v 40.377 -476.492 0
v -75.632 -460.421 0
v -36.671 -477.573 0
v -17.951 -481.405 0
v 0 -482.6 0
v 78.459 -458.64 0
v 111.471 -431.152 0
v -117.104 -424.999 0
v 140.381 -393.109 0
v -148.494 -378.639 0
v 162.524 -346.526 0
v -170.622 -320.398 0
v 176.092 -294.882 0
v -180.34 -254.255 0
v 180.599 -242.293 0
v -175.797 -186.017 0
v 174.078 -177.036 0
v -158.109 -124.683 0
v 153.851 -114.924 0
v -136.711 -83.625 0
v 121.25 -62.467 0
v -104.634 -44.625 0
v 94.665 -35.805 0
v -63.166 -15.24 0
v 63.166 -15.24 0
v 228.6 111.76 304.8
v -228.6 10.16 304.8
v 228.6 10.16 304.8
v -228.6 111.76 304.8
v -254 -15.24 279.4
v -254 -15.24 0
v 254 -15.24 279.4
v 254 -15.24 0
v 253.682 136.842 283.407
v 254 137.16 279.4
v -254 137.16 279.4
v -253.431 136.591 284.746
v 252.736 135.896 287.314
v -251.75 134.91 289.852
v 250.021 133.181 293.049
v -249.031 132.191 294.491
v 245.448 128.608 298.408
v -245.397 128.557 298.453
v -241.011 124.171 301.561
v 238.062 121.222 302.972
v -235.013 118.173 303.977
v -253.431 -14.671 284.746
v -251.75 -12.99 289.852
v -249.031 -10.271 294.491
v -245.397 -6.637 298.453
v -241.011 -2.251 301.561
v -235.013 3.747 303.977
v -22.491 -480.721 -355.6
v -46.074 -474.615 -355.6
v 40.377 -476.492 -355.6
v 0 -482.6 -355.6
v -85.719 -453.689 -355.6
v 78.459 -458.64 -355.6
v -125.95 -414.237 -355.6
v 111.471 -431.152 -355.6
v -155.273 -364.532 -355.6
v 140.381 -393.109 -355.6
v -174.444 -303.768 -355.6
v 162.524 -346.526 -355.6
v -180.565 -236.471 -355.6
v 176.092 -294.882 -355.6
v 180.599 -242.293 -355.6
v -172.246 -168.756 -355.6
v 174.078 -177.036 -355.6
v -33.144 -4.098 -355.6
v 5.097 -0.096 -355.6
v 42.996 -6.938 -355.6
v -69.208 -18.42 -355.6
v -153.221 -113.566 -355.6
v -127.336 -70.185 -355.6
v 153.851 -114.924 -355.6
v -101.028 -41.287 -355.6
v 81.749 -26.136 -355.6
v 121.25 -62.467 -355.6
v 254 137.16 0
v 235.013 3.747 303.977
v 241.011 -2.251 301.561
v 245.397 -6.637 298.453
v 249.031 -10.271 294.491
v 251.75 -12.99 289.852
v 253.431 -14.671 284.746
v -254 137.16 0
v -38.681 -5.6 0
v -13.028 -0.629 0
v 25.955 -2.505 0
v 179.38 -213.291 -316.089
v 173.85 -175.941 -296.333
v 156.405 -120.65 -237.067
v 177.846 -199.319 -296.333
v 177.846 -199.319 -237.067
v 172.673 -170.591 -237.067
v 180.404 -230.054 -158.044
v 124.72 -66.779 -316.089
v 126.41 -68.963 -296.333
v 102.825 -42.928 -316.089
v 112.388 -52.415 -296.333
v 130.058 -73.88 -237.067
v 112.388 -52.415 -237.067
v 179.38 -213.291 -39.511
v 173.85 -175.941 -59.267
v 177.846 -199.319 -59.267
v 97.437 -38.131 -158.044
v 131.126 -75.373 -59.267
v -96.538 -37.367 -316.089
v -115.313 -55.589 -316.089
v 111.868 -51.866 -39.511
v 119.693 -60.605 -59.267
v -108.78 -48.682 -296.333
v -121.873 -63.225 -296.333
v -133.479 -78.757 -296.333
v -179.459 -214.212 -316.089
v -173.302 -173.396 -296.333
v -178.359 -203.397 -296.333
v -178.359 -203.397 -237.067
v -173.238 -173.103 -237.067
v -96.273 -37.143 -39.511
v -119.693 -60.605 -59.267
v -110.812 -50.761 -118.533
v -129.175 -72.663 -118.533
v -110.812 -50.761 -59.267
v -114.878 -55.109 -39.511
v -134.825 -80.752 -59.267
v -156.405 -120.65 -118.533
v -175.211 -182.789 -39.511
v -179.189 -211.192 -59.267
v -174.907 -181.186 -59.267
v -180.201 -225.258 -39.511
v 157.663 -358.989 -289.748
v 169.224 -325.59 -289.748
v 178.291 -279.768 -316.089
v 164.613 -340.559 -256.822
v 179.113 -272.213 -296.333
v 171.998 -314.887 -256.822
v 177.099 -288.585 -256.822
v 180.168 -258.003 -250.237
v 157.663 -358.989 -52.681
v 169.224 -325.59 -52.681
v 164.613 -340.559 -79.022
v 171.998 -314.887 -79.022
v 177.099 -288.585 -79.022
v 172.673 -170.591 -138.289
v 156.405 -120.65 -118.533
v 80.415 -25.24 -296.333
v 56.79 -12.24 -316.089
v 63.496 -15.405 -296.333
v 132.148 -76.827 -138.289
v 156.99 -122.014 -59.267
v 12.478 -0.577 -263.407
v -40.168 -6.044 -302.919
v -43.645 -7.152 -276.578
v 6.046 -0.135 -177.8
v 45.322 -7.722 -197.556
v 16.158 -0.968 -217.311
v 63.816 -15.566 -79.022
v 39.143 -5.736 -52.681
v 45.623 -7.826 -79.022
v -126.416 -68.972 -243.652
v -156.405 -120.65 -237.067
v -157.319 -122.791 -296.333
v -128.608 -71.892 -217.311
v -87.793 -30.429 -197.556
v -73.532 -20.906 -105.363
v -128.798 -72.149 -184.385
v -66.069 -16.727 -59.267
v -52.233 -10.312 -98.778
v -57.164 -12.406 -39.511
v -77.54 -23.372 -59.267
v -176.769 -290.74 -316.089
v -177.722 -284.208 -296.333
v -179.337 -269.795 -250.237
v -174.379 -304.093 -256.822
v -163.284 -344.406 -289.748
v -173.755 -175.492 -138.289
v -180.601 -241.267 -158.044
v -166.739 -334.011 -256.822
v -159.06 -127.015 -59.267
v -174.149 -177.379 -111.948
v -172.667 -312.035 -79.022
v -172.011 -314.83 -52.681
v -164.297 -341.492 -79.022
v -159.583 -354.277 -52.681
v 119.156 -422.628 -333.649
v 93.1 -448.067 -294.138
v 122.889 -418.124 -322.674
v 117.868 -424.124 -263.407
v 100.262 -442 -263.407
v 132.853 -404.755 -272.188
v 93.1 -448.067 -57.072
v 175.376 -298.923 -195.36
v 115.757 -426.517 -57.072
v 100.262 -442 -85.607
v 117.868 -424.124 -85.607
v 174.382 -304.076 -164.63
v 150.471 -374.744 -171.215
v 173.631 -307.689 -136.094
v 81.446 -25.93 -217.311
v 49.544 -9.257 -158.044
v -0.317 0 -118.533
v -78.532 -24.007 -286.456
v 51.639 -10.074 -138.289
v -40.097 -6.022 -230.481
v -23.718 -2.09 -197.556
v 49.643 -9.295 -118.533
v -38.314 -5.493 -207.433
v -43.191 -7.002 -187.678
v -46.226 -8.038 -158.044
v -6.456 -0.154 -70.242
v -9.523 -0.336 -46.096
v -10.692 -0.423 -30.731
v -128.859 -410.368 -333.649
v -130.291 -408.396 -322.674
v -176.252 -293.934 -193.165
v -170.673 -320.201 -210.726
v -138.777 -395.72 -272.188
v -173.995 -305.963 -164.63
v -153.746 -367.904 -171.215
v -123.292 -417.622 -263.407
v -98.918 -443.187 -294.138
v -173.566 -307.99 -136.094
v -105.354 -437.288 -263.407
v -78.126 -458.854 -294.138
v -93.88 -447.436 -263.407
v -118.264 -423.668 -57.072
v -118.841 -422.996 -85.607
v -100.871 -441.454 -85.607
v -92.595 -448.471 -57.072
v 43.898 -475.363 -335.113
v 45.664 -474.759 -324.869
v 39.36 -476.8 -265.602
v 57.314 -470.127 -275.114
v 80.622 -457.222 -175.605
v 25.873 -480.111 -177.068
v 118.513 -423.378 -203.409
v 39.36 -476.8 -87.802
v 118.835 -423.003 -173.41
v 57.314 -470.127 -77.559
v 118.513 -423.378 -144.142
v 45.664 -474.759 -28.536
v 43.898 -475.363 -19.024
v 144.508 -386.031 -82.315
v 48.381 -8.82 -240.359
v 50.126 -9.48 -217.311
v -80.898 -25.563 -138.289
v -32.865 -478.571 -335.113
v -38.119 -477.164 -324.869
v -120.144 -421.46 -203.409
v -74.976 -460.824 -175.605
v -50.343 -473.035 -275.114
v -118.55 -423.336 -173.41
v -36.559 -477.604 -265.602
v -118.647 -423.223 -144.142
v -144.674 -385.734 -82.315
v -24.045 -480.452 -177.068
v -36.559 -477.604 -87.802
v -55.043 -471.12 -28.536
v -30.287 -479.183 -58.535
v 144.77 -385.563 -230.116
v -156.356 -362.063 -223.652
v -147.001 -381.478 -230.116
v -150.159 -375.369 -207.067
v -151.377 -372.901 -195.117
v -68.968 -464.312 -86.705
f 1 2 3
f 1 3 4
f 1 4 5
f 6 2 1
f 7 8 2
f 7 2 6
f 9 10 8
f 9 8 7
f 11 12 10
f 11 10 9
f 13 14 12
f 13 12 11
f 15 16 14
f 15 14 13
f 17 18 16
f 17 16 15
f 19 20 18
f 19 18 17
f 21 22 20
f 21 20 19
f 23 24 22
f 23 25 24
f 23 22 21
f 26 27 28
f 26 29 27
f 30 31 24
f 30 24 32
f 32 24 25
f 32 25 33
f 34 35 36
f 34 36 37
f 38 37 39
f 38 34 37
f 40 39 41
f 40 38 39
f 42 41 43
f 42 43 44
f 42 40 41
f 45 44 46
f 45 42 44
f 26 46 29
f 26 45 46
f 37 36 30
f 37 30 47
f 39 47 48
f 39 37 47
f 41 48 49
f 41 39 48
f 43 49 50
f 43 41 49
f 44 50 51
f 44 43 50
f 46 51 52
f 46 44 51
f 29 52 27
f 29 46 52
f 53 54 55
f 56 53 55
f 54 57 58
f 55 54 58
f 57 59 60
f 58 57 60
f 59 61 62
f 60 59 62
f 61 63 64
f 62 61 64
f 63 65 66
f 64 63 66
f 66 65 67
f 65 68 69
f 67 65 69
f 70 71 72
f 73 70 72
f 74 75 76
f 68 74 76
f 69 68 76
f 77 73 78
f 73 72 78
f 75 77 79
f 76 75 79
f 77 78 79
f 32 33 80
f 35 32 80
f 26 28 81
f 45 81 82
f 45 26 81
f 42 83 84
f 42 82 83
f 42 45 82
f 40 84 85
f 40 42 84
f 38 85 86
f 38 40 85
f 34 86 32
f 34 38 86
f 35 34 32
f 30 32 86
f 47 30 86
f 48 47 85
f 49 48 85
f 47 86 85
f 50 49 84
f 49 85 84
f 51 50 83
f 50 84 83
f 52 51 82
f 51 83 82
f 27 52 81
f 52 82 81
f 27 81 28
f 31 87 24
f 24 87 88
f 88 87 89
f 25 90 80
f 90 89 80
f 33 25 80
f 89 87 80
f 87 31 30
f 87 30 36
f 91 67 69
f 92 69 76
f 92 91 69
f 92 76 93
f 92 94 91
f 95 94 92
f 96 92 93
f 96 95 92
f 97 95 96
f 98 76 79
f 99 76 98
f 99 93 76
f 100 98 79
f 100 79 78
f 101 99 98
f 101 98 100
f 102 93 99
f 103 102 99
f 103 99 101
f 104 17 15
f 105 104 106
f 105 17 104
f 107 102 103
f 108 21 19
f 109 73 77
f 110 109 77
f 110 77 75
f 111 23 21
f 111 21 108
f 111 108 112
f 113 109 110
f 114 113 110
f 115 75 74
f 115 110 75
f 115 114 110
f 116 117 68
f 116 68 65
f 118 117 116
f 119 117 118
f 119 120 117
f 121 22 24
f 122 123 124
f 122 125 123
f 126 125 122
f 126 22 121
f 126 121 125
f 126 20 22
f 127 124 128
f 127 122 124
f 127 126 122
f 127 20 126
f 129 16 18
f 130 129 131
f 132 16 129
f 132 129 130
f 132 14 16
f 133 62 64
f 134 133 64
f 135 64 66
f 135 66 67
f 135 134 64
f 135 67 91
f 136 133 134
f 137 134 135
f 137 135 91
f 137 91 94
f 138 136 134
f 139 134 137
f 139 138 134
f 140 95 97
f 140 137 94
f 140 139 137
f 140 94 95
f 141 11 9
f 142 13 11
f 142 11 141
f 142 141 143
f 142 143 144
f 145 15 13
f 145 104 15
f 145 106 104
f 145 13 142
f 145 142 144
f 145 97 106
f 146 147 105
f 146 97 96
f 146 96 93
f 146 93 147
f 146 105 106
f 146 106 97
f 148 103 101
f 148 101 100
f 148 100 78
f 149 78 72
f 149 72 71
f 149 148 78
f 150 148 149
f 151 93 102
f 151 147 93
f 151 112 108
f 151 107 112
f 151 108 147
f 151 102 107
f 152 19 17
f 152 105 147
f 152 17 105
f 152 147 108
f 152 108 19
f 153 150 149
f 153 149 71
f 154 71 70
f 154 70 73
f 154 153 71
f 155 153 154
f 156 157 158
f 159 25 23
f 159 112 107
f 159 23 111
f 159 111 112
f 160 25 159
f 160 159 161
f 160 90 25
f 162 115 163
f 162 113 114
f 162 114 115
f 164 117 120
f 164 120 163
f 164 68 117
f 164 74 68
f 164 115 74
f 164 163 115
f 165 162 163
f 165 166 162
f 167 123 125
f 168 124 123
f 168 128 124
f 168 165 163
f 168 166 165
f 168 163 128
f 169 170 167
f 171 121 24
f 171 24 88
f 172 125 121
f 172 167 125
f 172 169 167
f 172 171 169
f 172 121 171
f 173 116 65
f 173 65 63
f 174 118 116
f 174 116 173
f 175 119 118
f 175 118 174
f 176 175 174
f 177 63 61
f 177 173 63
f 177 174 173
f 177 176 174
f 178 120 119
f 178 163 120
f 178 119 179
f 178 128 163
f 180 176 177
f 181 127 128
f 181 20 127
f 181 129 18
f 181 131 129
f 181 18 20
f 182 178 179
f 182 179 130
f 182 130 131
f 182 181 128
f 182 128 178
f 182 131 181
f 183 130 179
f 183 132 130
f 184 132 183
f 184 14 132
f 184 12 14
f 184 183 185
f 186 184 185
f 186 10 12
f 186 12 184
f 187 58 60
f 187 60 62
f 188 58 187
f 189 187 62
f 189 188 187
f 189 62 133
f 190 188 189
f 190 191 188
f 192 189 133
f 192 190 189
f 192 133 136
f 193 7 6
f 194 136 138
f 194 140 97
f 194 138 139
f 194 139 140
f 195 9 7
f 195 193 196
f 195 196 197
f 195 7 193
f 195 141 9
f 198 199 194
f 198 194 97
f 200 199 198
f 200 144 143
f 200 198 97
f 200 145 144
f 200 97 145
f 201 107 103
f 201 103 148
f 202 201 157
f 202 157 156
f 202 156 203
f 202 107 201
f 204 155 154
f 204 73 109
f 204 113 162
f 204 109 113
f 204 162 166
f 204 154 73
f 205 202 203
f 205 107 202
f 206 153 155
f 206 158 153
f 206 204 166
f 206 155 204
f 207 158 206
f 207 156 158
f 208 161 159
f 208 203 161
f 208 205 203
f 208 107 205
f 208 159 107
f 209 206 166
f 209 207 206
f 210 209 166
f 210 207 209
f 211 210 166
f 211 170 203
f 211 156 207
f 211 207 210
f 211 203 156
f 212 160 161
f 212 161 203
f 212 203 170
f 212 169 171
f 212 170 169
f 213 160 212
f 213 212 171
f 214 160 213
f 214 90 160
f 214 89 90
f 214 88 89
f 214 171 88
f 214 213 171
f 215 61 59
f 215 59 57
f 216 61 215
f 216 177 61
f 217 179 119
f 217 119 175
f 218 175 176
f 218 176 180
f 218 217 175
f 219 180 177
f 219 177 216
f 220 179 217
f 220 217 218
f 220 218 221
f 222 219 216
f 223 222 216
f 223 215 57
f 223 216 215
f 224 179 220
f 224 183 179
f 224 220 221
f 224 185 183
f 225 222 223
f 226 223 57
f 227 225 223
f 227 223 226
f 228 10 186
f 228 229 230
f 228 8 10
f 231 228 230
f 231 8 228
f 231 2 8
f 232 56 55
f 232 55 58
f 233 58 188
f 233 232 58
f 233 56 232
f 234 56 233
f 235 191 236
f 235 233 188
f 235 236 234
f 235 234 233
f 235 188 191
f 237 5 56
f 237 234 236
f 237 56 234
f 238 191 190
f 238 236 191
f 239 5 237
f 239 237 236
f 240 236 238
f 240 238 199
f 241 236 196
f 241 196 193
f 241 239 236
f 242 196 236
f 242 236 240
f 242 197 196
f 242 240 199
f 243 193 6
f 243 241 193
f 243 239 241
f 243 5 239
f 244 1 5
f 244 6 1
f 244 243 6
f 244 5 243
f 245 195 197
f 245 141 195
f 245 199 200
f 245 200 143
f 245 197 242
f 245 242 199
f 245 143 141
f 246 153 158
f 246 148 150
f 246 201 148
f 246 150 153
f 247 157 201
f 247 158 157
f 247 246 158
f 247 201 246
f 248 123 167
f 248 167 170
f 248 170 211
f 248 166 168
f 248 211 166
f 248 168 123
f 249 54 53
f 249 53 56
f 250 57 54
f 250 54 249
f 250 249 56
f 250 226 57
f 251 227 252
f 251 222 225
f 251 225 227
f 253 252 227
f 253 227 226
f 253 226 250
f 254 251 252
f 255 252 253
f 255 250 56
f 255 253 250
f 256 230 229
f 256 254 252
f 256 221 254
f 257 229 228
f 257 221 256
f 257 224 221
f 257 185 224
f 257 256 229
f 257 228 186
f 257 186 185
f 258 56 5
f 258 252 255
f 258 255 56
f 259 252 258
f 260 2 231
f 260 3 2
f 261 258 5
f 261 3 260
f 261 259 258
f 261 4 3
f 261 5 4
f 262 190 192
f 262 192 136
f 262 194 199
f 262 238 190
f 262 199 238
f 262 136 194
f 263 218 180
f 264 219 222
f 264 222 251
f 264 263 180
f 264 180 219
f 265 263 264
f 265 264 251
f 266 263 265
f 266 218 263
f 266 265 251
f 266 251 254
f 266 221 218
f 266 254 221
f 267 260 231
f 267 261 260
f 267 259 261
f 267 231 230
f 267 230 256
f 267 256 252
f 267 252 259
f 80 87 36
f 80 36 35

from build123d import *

# Parameters (mm, degrees)
F1_DEPTH = 355.6
F2_W     = 508
F2_H     = 152.4
F3_DEPTH = 304.8
F4_R     = 25.4


with BuildPart() as f1:
    # F0 (on Top) → F1 (new body)
    with BuildSketch(Plane.XY):
        with BuildLine():
            add(Edge.make_bspline(
                [(0, -482.6), (312.809674, -482.6), (156.404837, -120.65), (0, 241.3), (-156.404837, -120.65), (-312.809674, -482.6), (0, -482.6)],
                knots=[0, 0, 0, 2.094395, 2.094395, 4.18879, 4.18879, 6.283185, 6.283185, 6.283185], degree=2, weights=[1, 0.5, 1, 0.5, 1, 0.5, 1]))
        make_face()
    extrude(amount=-F1_DEPTH)

    # F2 (on face) → F3 (join)
    with BuildSketch(Plane.XY):
        with Locations((0, 60.96)):
            Rectangle(F2_W, F2_H)
    extrude(amount=F3_DEPTH)

    # F4
    f4_edges = [f1.edges().sort_by_distance(p)[0] for p in [
        (0, -15.24, 304.8),
        (254, 60.96, 304.8),
        (0, 137.16, 304.8),
        (-254, 60.96, 304.8),
    ]]
    fillet(f4_edges, radius=F4_R)


solid = f1.part
